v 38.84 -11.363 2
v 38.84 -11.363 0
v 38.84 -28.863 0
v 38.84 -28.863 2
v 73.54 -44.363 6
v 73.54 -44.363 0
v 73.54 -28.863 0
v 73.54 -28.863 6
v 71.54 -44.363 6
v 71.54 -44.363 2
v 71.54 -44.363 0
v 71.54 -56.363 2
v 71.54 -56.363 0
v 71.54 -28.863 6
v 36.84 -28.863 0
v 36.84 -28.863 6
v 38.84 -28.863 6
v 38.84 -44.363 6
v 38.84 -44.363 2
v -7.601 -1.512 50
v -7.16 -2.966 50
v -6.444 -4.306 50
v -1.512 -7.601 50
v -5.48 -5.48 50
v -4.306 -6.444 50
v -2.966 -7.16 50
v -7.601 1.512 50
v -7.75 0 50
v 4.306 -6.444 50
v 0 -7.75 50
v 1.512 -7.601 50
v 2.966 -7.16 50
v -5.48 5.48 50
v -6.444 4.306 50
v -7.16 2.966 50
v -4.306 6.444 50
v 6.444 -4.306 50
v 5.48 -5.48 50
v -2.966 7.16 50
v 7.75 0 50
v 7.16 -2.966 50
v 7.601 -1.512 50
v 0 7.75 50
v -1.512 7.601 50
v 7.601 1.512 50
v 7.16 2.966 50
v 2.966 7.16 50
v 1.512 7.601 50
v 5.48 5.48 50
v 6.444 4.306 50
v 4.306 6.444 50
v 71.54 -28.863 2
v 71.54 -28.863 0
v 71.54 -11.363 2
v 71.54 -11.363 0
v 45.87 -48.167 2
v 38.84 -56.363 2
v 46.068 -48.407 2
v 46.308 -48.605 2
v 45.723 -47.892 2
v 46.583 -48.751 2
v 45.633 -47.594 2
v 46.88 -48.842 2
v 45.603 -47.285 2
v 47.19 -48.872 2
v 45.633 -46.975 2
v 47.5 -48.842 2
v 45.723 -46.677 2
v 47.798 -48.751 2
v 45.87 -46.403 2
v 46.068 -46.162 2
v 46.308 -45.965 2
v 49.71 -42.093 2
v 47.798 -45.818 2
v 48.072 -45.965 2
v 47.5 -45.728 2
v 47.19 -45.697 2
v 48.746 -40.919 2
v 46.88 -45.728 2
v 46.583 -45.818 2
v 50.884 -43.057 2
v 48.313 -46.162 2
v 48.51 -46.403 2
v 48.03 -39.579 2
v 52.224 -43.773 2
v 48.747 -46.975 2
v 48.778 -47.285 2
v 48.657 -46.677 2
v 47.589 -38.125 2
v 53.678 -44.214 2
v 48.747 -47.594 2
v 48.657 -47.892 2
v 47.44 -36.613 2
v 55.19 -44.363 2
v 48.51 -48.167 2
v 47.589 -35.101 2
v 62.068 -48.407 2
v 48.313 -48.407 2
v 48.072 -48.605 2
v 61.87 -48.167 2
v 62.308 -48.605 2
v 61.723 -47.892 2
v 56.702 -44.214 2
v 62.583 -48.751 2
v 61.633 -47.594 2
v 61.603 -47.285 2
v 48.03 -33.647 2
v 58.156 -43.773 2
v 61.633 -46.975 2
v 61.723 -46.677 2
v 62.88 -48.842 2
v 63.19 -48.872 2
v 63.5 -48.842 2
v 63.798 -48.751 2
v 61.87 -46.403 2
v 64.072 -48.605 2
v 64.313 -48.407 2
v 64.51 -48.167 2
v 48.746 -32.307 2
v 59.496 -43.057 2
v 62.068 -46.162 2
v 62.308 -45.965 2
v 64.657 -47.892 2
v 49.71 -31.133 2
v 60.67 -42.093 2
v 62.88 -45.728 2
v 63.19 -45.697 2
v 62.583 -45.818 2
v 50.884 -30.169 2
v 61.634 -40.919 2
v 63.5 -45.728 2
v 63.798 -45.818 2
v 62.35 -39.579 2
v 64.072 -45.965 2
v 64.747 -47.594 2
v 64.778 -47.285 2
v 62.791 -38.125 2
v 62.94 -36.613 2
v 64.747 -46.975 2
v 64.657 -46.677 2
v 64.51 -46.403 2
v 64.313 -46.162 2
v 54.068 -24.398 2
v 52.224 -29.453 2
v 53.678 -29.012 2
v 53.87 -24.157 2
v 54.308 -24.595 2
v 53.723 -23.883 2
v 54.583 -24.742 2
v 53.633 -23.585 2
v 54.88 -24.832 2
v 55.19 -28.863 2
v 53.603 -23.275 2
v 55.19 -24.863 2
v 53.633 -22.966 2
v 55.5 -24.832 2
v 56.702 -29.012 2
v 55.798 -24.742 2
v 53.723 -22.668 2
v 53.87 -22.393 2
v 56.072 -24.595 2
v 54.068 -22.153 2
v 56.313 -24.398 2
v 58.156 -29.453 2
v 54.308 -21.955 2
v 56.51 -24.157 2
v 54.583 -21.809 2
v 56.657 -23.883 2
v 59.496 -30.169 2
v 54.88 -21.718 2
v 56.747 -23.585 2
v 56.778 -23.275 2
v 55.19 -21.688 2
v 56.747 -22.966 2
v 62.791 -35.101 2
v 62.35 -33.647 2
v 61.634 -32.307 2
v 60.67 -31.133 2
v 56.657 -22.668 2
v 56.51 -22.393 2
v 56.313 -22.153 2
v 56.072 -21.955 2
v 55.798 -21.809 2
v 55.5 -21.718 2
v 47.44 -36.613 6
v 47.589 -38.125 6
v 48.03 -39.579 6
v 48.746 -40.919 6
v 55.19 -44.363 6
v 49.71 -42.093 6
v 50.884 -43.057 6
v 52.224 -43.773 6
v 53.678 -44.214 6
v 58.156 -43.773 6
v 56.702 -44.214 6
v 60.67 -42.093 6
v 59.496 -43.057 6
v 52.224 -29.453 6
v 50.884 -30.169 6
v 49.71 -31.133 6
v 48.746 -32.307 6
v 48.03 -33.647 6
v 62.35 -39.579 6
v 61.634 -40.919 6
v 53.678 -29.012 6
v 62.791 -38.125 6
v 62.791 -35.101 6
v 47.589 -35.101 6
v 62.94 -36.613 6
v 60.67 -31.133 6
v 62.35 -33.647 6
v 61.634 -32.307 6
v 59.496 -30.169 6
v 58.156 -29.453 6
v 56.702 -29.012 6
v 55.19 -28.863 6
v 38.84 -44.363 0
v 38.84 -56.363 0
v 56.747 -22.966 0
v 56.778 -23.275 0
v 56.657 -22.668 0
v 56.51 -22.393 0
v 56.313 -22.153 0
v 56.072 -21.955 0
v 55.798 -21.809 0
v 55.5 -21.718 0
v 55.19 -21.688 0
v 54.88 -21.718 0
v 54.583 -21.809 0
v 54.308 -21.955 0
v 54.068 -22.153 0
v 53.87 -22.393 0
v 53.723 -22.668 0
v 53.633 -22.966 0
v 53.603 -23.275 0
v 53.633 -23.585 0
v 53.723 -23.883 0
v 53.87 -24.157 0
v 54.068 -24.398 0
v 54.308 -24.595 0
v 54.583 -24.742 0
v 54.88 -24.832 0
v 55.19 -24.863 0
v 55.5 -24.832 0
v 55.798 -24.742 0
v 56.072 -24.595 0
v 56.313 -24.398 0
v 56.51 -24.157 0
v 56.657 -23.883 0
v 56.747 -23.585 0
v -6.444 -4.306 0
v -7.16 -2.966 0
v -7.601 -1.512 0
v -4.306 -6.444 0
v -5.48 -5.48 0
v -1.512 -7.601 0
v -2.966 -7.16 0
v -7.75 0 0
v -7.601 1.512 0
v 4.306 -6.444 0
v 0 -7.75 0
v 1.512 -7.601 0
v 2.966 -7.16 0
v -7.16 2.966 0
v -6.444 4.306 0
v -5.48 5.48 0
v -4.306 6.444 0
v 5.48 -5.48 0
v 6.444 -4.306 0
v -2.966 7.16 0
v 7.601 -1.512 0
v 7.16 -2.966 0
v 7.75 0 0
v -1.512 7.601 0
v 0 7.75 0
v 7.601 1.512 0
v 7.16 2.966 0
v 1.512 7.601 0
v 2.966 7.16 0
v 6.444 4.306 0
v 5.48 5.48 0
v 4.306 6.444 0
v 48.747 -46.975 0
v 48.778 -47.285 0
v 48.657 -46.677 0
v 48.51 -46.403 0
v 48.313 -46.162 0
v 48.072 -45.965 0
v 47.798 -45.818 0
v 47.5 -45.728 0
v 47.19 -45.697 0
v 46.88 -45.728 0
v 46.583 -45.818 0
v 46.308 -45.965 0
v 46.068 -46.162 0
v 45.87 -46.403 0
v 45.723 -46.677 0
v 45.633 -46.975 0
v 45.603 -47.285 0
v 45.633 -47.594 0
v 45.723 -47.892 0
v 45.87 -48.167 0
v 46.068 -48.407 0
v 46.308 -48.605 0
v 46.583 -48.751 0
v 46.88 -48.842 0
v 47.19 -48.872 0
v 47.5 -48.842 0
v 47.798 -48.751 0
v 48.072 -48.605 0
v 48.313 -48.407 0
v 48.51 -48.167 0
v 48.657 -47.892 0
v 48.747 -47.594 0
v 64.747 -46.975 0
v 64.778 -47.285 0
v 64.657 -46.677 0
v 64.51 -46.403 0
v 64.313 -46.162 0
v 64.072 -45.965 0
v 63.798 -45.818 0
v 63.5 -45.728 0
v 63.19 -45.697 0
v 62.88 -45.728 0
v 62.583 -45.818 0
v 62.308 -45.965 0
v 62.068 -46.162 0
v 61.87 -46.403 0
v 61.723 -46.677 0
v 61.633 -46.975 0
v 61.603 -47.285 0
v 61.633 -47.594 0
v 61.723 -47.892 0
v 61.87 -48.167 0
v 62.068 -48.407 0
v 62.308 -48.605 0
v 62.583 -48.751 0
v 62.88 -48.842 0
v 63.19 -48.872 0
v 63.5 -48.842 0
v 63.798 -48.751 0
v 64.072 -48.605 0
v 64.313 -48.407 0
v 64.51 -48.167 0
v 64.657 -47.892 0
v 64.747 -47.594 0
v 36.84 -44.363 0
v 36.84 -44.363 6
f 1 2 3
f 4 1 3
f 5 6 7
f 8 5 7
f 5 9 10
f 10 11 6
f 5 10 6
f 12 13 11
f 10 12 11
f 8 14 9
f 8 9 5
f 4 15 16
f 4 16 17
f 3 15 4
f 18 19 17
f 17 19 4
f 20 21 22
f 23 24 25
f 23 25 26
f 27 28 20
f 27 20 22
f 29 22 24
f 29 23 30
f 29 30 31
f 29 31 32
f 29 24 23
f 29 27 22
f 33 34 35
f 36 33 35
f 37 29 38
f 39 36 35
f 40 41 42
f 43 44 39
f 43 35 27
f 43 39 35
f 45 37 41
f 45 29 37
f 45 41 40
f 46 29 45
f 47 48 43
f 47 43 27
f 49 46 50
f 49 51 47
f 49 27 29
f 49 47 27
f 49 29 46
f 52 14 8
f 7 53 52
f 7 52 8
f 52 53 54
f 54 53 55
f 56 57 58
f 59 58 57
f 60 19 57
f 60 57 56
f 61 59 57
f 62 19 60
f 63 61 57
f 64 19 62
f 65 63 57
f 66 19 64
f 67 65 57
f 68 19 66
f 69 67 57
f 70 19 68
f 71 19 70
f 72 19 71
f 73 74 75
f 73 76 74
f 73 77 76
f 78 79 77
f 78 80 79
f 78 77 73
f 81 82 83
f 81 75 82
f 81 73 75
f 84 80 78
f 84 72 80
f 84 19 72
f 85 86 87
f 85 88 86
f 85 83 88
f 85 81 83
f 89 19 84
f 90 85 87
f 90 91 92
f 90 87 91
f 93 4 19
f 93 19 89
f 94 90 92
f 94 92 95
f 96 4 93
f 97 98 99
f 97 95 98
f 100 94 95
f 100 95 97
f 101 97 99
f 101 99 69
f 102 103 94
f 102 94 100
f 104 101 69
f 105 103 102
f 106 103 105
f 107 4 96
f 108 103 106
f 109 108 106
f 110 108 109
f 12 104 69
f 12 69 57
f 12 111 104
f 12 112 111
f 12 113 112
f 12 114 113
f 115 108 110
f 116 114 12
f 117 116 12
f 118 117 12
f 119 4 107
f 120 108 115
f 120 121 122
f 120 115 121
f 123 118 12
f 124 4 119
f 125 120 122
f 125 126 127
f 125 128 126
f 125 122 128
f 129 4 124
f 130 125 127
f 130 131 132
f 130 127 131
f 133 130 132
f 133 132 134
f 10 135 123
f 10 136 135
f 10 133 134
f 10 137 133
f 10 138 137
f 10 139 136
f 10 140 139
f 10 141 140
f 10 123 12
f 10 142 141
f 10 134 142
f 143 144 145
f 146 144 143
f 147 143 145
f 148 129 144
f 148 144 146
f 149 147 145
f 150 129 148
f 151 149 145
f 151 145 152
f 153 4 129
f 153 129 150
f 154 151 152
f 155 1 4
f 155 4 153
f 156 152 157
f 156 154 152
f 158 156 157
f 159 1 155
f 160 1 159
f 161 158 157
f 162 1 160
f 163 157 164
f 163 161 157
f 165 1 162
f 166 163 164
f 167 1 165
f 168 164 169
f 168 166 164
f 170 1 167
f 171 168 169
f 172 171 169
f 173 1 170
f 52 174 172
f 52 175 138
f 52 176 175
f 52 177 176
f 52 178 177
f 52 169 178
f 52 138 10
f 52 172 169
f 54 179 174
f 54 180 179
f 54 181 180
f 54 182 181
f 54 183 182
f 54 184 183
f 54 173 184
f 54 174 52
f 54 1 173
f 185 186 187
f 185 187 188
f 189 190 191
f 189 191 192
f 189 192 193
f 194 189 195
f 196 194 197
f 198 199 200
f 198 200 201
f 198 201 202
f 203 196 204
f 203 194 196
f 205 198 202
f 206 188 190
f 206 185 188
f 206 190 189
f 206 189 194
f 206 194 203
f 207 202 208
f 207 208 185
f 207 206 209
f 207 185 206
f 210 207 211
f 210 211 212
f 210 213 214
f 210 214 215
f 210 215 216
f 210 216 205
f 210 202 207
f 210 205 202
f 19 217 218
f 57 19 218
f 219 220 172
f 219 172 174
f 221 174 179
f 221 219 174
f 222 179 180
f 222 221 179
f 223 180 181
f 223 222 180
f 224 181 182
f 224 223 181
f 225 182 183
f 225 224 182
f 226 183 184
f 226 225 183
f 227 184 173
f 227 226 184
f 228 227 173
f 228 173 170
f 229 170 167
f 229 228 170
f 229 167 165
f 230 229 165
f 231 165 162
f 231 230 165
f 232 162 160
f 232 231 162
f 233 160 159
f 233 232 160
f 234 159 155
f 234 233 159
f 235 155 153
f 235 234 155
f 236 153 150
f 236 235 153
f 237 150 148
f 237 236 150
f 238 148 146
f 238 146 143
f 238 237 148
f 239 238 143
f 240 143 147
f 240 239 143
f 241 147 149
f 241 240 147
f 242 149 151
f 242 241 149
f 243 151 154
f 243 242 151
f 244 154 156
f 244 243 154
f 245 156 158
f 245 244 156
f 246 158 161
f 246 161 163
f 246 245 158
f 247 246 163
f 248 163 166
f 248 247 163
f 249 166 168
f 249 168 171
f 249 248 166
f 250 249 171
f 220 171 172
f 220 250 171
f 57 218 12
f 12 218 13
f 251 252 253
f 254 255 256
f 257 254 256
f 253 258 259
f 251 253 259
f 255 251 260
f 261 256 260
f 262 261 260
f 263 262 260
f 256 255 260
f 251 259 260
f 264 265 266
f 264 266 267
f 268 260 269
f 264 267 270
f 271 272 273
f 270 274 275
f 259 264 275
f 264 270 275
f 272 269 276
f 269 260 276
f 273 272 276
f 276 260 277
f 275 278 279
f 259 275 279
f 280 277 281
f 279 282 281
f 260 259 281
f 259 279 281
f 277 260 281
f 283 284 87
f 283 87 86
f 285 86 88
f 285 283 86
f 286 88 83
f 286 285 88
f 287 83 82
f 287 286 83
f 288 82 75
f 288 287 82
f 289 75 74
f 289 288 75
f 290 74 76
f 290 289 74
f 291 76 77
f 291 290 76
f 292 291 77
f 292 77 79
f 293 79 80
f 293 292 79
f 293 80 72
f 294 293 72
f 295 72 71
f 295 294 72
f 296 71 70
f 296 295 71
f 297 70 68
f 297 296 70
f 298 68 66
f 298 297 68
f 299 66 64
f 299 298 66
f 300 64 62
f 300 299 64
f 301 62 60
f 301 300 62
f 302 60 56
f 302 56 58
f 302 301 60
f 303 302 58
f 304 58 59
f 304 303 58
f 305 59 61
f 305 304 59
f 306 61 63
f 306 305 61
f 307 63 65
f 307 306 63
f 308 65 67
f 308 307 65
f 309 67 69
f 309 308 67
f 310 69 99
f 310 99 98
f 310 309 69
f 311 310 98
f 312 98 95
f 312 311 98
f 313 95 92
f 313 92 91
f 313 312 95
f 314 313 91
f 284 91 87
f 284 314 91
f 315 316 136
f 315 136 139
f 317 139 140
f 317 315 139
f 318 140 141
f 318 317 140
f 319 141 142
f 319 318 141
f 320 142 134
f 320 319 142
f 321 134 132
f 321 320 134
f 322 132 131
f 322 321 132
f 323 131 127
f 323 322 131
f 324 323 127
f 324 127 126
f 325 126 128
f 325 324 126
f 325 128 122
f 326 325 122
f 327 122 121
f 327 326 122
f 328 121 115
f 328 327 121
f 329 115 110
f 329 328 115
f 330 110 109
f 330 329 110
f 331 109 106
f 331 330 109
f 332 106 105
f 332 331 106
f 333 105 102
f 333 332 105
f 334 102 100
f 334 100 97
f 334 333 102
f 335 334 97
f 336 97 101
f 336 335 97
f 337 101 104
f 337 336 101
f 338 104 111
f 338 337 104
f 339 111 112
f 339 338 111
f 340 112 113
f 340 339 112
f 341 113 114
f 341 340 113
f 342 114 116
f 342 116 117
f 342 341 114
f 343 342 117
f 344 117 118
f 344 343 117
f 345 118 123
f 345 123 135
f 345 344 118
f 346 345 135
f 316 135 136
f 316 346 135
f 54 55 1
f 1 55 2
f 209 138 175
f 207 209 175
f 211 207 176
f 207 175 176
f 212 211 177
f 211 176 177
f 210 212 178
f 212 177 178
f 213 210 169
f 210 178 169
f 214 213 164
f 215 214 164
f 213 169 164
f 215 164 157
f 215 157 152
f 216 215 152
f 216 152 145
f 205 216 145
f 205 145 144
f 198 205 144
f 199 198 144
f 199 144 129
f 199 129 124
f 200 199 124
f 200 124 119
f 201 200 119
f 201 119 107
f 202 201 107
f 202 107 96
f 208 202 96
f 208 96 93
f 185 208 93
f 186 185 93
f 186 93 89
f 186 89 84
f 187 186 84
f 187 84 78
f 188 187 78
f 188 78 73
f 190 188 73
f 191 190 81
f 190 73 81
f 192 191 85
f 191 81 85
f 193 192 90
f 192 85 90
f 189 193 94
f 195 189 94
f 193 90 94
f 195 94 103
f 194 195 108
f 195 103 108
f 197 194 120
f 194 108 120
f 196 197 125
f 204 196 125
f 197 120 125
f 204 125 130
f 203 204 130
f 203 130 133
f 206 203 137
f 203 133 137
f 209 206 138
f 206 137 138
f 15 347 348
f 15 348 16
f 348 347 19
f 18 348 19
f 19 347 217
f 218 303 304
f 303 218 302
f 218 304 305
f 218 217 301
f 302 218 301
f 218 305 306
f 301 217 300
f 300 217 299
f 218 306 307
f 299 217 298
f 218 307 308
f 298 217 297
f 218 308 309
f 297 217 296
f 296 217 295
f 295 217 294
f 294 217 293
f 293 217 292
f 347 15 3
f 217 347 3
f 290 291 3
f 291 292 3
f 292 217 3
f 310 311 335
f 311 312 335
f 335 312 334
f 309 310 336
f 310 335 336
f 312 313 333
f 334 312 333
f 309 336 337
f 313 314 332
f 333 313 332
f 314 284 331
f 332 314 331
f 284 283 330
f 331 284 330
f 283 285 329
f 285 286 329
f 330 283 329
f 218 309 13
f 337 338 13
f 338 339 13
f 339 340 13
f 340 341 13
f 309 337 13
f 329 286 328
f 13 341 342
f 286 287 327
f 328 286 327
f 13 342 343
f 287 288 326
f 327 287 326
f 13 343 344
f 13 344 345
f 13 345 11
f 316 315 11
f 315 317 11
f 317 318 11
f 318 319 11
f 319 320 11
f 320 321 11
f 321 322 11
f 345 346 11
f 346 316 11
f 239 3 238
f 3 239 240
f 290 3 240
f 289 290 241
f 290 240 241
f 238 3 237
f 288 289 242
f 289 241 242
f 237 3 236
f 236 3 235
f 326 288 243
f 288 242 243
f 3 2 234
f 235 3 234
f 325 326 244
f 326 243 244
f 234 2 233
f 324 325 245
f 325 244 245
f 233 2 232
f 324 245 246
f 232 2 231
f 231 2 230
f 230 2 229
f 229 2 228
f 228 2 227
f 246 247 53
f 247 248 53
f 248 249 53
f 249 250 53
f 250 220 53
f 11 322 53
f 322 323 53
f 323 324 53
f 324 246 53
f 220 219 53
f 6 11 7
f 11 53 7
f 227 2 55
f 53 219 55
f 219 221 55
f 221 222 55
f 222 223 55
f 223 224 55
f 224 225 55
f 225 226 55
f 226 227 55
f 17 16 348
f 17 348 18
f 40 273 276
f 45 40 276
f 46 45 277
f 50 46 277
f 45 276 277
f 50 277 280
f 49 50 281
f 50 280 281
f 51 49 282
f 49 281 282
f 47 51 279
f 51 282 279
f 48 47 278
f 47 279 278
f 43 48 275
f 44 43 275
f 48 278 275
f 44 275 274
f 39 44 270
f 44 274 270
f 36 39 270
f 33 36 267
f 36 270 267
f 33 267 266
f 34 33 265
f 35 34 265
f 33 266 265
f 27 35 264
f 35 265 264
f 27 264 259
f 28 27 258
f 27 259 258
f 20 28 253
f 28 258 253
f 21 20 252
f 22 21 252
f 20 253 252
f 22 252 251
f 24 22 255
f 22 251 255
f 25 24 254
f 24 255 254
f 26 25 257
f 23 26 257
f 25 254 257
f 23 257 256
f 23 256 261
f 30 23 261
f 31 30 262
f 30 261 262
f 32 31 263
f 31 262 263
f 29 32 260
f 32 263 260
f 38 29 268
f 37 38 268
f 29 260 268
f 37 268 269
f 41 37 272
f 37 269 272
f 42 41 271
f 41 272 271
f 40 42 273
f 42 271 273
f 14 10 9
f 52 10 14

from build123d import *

# Parameters (mm, degrees)
F0_R     = 7.75
F1_DEPTH = 50
F2_R     = 1.5875
F2_R_2   = 7.75
F2_W     = 2
F2_H     = 15.5
F3_DEPTH = 2
F4_DEPTH = 6


with BuildPart() as f1:
    # F0 (on Top) → F1 (new body)
    with BuildSketch(Plane.XY):
        Circle(F0_R)
    extrude(amount=F1_DEPTH)


with BuildPart() as f3:
    # F2 (on Top) → F3 (new body)
    with BuildSketch(Plane.XY):
        Polygon((71.540075, -11.362871), (38.840075, -11.362871), (38.840075, -28.862871), (38.840075, -44.362871), (38.840075, -56.362871), (71.540075, -56.362871), (71.540075, -44.362871), (71.540075, -28.862871), align=None)
        with Locations((47.190075, -47.284745)):
            Circle(F2_R, mode=Mode.SUBTRACT)
        with Locations((63.190075, -47.284745)):
            Circle(F2_R, mode=Mode.SUBTRACT)
        with Locations((55.190075, -36.612871)):
            Circle(F2_R_2, mode=Mode.SUBTRACT)
        with Locations((55.190075, -23.275371)):
            Circle(F2_R, mode=Mode.SUBTRACT)
        with Locations((37.840075, -36.612871)):
            Rectangle(F2_W, F2_H)
        with Locations((72.540075, -36.612871)):
            Rectangle(F2_W, F2_H)
    extrude(amount=F3_DEPTH)

    # F2 (on Top) → F4 (join)
    with BuildSketch(Plane.XY):
        with Locations((55.190075, -36.612871)):
            Circle(F2_R_2)
        with Locations((37.840075, -36.612871)):
            Rectangle(F2_W, F2_H)
        with Locations((72.540075, -36.612871)):
            Rectangle(F2_W, F2_H)
    extrude(amount=F4_DEPTH)


solid = Compound([f1.part, f3.part])
